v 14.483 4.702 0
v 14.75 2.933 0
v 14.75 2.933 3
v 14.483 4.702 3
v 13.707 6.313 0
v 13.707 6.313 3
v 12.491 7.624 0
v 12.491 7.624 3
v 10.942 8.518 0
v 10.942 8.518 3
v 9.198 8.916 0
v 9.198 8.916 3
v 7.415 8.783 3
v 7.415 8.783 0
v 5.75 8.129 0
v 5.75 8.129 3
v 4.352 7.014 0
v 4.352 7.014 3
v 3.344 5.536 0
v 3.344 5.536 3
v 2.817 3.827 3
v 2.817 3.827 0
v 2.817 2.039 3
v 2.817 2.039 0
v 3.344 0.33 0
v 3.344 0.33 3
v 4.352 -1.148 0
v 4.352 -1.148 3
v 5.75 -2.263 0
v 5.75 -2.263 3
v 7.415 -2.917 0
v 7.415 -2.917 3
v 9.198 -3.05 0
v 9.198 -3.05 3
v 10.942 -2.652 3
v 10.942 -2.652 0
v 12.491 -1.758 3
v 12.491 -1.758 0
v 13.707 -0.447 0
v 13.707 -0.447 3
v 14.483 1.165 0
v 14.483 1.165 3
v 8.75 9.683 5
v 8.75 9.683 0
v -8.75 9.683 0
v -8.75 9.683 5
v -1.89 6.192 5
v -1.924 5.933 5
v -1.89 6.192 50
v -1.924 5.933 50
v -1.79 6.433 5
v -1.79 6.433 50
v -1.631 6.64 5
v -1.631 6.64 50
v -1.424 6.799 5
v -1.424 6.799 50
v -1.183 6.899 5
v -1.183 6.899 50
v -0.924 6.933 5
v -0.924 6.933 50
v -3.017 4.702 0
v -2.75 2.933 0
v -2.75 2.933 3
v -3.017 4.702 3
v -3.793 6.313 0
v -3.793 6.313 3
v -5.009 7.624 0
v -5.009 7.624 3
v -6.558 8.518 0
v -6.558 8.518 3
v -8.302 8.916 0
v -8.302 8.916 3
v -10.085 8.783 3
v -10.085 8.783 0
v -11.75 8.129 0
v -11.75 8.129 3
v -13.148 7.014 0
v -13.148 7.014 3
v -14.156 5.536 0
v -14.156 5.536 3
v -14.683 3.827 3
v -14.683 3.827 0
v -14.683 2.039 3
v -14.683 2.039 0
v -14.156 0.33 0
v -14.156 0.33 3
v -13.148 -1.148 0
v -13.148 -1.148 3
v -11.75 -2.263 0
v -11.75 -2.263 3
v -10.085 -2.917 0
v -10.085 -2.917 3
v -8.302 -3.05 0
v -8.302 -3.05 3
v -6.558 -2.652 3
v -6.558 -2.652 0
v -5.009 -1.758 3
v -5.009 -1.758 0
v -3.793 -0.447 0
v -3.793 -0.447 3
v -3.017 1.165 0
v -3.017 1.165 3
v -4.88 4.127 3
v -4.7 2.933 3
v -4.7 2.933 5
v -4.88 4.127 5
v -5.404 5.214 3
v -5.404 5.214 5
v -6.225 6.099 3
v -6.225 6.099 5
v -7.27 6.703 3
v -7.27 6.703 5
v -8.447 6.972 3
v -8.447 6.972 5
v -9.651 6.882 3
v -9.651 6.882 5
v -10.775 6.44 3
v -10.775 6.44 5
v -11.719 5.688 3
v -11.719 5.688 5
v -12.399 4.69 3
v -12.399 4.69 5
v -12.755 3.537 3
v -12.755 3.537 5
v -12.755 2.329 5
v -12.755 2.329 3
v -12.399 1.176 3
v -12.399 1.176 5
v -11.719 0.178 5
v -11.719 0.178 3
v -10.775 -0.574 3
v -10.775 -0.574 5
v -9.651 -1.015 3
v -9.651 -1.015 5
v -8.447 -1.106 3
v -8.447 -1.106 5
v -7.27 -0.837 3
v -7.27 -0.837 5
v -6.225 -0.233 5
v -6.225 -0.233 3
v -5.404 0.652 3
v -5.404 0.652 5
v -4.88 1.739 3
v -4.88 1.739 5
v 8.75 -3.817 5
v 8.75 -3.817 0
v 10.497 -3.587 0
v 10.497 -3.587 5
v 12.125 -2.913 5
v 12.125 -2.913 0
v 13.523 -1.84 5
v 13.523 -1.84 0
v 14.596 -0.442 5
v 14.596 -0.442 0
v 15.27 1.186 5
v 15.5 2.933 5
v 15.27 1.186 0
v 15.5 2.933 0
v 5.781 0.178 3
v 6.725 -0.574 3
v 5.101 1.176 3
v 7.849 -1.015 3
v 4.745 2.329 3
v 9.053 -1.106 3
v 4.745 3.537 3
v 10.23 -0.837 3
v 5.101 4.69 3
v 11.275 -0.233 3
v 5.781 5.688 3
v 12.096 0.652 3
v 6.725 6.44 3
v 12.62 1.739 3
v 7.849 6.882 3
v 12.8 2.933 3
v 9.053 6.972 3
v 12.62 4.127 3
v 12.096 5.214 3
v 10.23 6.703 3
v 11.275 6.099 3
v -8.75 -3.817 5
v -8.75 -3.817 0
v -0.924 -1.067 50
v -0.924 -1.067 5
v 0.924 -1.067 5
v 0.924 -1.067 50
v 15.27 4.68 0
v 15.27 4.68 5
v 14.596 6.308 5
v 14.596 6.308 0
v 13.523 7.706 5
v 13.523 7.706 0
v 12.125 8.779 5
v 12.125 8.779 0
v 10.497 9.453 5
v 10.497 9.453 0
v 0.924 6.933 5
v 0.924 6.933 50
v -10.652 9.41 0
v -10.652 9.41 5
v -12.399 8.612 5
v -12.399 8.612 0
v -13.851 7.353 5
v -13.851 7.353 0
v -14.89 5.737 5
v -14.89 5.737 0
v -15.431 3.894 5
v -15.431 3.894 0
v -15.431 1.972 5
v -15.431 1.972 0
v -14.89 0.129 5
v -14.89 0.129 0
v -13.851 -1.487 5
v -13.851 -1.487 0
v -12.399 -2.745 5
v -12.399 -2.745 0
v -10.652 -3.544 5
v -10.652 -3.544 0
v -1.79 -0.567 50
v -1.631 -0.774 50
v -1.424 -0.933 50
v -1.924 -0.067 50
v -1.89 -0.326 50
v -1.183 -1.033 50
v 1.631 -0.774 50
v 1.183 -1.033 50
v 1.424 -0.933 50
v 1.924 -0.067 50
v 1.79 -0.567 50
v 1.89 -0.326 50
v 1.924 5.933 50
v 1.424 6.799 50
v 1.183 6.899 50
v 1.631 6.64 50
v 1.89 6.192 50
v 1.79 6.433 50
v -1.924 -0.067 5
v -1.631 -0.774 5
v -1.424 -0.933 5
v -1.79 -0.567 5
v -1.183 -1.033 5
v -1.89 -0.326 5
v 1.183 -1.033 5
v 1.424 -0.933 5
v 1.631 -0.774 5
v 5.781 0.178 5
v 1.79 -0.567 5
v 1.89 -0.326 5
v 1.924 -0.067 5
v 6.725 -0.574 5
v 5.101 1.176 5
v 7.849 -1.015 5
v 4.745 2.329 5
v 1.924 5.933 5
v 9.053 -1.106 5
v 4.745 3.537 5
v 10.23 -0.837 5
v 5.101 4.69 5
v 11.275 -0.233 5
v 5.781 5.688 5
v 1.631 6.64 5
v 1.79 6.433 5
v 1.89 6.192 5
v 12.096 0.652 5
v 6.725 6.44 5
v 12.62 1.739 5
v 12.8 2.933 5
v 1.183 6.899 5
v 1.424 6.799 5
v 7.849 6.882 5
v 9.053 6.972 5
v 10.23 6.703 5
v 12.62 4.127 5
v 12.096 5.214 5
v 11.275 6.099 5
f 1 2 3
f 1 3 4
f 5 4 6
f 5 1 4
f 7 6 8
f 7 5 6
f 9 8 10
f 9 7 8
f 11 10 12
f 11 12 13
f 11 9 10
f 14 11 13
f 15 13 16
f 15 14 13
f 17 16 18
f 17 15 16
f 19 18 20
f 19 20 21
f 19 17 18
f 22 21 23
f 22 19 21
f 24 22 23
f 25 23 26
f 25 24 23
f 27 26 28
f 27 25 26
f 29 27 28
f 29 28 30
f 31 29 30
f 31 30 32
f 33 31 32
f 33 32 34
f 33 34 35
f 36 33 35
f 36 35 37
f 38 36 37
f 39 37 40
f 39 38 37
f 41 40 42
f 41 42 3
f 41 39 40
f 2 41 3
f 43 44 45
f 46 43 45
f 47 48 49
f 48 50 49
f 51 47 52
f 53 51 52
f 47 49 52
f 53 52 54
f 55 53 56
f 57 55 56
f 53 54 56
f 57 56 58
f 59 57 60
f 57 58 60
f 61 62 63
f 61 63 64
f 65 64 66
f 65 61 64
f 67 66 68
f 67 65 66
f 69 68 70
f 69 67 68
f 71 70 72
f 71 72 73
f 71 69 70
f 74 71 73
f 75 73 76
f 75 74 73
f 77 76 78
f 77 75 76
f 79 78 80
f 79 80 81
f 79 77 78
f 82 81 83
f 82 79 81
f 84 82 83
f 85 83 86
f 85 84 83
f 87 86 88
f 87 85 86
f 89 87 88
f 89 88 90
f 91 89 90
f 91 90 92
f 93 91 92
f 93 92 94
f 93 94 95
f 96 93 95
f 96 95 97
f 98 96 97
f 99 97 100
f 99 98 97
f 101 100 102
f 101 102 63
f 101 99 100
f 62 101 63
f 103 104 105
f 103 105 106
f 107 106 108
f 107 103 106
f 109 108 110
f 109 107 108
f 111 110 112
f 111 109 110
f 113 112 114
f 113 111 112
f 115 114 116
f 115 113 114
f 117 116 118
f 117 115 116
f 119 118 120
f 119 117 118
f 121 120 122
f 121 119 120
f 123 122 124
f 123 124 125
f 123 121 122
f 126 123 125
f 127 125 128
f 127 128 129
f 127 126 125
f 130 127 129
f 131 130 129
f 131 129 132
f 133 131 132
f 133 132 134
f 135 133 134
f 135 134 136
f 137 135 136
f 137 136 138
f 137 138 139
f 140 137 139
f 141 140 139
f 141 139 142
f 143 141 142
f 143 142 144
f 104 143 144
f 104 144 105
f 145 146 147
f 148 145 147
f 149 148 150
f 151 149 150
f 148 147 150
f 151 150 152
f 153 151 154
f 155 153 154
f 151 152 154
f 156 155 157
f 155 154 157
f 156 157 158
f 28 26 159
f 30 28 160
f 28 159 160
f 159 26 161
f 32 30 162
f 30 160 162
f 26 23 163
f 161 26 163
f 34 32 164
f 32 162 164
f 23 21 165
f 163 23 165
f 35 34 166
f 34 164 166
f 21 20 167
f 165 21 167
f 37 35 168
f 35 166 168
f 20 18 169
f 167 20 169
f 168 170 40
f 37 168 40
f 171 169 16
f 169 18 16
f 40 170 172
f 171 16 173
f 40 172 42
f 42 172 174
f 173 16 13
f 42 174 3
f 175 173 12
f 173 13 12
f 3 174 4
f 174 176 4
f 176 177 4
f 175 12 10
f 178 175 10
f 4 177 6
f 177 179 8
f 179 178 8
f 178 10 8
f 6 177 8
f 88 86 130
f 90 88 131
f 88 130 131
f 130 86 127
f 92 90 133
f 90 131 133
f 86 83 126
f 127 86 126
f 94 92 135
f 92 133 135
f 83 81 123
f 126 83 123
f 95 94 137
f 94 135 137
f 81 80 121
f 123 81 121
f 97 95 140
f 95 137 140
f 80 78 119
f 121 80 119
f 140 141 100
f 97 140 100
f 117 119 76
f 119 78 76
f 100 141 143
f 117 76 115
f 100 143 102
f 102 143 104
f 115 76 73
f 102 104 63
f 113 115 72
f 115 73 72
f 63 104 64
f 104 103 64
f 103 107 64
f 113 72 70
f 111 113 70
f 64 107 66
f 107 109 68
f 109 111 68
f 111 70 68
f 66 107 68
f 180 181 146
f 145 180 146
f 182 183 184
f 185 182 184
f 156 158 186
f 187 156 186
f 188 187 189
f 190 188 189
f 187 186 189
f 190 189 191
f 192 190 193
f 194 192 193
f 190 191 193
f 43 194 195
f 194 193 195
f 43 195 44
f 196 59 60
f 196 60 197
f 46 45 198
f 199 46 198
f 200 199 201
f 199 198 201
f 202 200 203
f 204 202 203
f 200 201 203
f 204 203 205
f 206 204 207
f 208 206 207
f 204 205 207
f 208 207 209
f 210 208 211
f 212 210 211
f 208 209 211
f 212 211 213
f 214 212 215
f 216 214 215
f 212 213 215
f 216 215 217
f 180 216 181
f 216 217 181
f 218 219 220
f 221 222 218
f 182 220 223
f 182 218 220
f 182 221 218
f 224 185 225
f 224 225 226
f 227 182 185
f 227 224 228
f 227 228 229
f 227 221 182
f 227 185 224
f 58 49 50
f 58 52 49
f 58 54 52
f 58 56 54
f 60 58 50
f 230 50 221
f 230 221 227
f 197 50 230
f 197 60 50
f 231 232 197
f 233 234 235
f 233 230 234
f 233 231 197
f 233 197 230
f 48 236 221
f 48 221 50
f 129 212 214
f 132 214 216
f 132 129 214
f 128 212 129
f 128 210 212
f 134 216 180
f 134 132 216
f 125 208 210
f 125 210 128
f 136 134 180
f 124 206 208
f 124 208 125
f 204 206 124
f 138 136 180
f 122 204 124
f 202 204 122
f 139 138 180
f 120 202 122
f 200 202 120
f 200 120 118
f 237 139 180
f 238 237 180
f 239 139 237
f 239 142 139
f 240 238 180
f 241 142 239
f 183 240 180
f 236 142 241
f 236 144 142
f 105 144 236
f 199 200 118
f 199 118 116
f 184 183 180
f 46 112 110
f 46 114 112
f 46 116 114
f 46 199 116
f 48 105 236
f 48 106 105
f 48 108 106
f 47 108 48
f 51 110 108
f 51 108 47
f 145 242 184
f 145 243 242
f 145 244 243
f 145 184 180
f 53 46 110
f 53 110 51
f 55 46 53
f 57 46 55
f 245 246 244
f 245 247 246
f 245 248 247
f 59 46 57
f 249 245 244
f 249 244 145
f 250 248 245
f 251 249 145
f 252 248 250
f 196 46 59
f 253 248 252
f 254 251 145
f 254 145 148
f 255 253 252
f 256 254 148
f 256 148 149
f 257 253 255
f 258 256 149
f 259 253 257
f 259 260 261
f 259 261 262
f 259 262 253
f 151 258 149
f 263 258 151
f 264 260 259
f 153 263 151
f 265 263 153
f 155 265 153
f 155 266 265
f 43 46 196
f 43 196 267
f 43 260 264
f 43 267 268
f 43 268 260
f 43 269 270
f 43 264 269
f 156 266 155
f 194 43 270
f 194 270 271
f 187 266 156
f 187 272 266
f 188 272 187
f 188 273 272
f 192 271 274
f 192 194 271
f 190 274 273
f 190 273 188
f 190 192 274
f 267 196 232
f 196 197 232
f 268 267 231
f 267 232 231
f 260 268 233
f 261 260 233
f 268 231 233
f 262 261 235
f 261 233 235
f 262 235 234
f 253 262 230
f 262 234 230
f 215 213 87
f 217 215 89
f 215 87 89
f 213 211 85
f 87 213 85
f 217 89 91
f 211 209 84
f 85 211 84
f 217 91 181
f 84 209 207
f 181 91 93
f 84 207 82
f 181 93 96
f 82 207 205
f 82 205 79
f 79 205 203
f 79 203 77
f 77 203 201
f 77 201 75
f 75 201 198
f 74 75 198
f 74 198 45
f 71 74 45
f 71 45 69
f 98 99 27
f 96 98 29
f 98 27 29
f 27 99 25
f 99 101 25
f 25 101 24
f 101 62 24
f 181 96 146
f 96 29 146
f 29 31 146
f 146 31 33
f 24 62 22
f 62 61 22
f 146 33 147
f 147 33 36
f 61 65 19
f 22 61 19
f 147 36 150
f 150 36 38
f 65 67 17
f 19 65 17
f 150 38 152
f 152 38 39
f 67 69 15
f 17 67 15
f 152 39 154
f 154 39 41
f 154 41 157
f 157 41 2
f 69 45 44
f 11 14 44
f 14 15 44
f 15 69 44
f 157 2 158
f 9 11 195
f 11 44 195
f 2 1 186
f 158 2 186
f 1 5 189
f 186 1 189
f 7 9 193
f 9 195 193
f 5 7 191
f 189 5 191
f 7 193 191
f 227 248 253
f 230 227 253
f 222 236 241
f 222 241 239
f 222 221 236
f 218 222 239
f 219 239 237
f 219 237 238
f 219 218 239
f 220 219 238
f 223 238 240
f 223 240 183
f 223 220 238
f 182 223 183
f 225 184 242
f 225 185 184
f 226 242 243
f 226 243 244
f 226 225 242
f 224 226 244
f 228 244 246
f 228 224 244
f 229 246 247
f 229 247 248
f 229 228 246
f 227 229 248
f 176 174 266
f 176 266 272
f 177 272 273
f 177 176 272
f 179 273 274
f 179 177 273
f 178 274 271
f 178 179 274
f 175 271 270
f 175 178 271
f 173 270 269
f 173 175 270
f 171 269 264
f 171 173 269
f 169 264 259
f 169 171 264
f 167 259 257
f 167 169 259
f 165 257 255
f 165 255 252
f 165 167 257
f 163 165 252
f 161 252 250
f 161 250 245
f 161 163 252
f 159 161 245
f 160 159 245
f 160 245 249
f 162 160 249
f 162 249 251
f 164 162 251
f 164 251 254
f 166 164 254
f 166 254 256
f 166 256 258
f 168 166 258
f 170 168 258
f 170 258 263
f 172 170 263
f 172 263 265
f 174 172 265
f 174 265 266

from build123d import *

# Parameters (mm, degrees)
F0_W     = 3.848
F0_H     = 8
F0_R     = 6
F0_R_2   = 4.05
F1_DEPTH = 5
F2_DEPTH = 3
F3_DEPTH = 50
F4_R     = 1


with BuildPart() as f1:
    # F0 (on Top) → F1 (new body)
    with BuildSketch(Plane.XY):
        with BuildLine():
            ThreePointArc((-8.75, 9.683053), (-3.977029, 7.706024), (-2, 2.933053))
            ThreePointArc((-2, 2.933053), (-3.977029, -1.839918), (-8.75, -3.816947))
            Line((-8.75, -3.816947), (8.75, -3.816947))
            ThreePointArc((8.75, -3.816947), (2, 2.933053), (8.75, 9.683053))
            Line((8.75, 9.683053), (-8.75, 9.683053))
        make_face()
        with Locations((0, 2.933053)):
            Rectangle(F0_W, F0_H, mode=Mode.SUBTRACT)
        with BuildLine():
            ThreePointArc((-8.75, -3.816947), (-3.977029, -1.839918), (-2, 2.933053))
            ThreePointArc((-2, 2.933053), (-3.977029, 7.706024), (-8.75, 9.683053))
            ThreePointArc((-8.75, 9.683053), (-15.5, 2.933053), (-8.75, -3.816947))
        make_face()
        with Locations((-8.75, 2.933053)):
            Circle(F0_R, mode=Mode.SUBTRACT)
        with BuildLine():
            ThreePointArc((15.5, 2.933053), (13.522971, 7.706024), (8.75, 9.683053))
            ThreePointArc((8.75, 9.683053), (2, 2.933053), (8.75, -3.816947))
            ThreePointArc((8.75, -3.816947), (13.522971, -1.839918), (15.5, 2.933053))
        make_face()
        with Locations((8.75, 2.933053)):
            Circle(F0_R, mode=Mode.SUBTRACT)
        with Locations((-8.75, 2.933053)):
            Circle(F0_R)
        with Locations((-8.75, 2.933053)):
            Circle(F0_R_2, mode=Mode.SUBTRACT)
        with Locations((8.75, 2.933053)):
            Circle(F0_R)
        with Locations((8.75, 2.933053)):
            Circle(F0_R_2, mode=Mode.SUBTRACT)
    extrude(amount=F1_DEPTH)

    # F0 (on Top) → F2 (cut)
    with BuildSketch(Plane.XY):
        with Locations((-8.75, 2.933053)):
            Circle(F0_R)
        with Locations((-8.75, 2.933053)):
            Circle(F0_R_2, mode=Mode.SUBTRACT)
        with Locations((8.75, 2.933053)):
            Circle(F0_R)
        with Locations((8.75, 2.933053)):
            Circle(F0_R_2, mode=Mode.SUBTRACT)
    extrude(amount=F2_DEPTH, mode=Mode.SUBTRACT)

    # F0 (on Top) → F3 (join)
    with BuildSketch(Plane.XY):
        with Locations((0, 2.933053)):
            Rectangle(F0_W, F0_H)
    extrude(amount=F3_DEPTH)

    # F4
    f4_edges = [f1.edges().sort_by_distance(p)[0] for p in [
        (-1.924, -1.066947, 27.5),
        (1.924, -1.066947, 27.5),
        (1.924, 6.933053, 27.5),
        (-1.924, 6.933053, 27.5),
    ]]
    fillet(f4_edges, radius=F4_R)


solid = f1.part
